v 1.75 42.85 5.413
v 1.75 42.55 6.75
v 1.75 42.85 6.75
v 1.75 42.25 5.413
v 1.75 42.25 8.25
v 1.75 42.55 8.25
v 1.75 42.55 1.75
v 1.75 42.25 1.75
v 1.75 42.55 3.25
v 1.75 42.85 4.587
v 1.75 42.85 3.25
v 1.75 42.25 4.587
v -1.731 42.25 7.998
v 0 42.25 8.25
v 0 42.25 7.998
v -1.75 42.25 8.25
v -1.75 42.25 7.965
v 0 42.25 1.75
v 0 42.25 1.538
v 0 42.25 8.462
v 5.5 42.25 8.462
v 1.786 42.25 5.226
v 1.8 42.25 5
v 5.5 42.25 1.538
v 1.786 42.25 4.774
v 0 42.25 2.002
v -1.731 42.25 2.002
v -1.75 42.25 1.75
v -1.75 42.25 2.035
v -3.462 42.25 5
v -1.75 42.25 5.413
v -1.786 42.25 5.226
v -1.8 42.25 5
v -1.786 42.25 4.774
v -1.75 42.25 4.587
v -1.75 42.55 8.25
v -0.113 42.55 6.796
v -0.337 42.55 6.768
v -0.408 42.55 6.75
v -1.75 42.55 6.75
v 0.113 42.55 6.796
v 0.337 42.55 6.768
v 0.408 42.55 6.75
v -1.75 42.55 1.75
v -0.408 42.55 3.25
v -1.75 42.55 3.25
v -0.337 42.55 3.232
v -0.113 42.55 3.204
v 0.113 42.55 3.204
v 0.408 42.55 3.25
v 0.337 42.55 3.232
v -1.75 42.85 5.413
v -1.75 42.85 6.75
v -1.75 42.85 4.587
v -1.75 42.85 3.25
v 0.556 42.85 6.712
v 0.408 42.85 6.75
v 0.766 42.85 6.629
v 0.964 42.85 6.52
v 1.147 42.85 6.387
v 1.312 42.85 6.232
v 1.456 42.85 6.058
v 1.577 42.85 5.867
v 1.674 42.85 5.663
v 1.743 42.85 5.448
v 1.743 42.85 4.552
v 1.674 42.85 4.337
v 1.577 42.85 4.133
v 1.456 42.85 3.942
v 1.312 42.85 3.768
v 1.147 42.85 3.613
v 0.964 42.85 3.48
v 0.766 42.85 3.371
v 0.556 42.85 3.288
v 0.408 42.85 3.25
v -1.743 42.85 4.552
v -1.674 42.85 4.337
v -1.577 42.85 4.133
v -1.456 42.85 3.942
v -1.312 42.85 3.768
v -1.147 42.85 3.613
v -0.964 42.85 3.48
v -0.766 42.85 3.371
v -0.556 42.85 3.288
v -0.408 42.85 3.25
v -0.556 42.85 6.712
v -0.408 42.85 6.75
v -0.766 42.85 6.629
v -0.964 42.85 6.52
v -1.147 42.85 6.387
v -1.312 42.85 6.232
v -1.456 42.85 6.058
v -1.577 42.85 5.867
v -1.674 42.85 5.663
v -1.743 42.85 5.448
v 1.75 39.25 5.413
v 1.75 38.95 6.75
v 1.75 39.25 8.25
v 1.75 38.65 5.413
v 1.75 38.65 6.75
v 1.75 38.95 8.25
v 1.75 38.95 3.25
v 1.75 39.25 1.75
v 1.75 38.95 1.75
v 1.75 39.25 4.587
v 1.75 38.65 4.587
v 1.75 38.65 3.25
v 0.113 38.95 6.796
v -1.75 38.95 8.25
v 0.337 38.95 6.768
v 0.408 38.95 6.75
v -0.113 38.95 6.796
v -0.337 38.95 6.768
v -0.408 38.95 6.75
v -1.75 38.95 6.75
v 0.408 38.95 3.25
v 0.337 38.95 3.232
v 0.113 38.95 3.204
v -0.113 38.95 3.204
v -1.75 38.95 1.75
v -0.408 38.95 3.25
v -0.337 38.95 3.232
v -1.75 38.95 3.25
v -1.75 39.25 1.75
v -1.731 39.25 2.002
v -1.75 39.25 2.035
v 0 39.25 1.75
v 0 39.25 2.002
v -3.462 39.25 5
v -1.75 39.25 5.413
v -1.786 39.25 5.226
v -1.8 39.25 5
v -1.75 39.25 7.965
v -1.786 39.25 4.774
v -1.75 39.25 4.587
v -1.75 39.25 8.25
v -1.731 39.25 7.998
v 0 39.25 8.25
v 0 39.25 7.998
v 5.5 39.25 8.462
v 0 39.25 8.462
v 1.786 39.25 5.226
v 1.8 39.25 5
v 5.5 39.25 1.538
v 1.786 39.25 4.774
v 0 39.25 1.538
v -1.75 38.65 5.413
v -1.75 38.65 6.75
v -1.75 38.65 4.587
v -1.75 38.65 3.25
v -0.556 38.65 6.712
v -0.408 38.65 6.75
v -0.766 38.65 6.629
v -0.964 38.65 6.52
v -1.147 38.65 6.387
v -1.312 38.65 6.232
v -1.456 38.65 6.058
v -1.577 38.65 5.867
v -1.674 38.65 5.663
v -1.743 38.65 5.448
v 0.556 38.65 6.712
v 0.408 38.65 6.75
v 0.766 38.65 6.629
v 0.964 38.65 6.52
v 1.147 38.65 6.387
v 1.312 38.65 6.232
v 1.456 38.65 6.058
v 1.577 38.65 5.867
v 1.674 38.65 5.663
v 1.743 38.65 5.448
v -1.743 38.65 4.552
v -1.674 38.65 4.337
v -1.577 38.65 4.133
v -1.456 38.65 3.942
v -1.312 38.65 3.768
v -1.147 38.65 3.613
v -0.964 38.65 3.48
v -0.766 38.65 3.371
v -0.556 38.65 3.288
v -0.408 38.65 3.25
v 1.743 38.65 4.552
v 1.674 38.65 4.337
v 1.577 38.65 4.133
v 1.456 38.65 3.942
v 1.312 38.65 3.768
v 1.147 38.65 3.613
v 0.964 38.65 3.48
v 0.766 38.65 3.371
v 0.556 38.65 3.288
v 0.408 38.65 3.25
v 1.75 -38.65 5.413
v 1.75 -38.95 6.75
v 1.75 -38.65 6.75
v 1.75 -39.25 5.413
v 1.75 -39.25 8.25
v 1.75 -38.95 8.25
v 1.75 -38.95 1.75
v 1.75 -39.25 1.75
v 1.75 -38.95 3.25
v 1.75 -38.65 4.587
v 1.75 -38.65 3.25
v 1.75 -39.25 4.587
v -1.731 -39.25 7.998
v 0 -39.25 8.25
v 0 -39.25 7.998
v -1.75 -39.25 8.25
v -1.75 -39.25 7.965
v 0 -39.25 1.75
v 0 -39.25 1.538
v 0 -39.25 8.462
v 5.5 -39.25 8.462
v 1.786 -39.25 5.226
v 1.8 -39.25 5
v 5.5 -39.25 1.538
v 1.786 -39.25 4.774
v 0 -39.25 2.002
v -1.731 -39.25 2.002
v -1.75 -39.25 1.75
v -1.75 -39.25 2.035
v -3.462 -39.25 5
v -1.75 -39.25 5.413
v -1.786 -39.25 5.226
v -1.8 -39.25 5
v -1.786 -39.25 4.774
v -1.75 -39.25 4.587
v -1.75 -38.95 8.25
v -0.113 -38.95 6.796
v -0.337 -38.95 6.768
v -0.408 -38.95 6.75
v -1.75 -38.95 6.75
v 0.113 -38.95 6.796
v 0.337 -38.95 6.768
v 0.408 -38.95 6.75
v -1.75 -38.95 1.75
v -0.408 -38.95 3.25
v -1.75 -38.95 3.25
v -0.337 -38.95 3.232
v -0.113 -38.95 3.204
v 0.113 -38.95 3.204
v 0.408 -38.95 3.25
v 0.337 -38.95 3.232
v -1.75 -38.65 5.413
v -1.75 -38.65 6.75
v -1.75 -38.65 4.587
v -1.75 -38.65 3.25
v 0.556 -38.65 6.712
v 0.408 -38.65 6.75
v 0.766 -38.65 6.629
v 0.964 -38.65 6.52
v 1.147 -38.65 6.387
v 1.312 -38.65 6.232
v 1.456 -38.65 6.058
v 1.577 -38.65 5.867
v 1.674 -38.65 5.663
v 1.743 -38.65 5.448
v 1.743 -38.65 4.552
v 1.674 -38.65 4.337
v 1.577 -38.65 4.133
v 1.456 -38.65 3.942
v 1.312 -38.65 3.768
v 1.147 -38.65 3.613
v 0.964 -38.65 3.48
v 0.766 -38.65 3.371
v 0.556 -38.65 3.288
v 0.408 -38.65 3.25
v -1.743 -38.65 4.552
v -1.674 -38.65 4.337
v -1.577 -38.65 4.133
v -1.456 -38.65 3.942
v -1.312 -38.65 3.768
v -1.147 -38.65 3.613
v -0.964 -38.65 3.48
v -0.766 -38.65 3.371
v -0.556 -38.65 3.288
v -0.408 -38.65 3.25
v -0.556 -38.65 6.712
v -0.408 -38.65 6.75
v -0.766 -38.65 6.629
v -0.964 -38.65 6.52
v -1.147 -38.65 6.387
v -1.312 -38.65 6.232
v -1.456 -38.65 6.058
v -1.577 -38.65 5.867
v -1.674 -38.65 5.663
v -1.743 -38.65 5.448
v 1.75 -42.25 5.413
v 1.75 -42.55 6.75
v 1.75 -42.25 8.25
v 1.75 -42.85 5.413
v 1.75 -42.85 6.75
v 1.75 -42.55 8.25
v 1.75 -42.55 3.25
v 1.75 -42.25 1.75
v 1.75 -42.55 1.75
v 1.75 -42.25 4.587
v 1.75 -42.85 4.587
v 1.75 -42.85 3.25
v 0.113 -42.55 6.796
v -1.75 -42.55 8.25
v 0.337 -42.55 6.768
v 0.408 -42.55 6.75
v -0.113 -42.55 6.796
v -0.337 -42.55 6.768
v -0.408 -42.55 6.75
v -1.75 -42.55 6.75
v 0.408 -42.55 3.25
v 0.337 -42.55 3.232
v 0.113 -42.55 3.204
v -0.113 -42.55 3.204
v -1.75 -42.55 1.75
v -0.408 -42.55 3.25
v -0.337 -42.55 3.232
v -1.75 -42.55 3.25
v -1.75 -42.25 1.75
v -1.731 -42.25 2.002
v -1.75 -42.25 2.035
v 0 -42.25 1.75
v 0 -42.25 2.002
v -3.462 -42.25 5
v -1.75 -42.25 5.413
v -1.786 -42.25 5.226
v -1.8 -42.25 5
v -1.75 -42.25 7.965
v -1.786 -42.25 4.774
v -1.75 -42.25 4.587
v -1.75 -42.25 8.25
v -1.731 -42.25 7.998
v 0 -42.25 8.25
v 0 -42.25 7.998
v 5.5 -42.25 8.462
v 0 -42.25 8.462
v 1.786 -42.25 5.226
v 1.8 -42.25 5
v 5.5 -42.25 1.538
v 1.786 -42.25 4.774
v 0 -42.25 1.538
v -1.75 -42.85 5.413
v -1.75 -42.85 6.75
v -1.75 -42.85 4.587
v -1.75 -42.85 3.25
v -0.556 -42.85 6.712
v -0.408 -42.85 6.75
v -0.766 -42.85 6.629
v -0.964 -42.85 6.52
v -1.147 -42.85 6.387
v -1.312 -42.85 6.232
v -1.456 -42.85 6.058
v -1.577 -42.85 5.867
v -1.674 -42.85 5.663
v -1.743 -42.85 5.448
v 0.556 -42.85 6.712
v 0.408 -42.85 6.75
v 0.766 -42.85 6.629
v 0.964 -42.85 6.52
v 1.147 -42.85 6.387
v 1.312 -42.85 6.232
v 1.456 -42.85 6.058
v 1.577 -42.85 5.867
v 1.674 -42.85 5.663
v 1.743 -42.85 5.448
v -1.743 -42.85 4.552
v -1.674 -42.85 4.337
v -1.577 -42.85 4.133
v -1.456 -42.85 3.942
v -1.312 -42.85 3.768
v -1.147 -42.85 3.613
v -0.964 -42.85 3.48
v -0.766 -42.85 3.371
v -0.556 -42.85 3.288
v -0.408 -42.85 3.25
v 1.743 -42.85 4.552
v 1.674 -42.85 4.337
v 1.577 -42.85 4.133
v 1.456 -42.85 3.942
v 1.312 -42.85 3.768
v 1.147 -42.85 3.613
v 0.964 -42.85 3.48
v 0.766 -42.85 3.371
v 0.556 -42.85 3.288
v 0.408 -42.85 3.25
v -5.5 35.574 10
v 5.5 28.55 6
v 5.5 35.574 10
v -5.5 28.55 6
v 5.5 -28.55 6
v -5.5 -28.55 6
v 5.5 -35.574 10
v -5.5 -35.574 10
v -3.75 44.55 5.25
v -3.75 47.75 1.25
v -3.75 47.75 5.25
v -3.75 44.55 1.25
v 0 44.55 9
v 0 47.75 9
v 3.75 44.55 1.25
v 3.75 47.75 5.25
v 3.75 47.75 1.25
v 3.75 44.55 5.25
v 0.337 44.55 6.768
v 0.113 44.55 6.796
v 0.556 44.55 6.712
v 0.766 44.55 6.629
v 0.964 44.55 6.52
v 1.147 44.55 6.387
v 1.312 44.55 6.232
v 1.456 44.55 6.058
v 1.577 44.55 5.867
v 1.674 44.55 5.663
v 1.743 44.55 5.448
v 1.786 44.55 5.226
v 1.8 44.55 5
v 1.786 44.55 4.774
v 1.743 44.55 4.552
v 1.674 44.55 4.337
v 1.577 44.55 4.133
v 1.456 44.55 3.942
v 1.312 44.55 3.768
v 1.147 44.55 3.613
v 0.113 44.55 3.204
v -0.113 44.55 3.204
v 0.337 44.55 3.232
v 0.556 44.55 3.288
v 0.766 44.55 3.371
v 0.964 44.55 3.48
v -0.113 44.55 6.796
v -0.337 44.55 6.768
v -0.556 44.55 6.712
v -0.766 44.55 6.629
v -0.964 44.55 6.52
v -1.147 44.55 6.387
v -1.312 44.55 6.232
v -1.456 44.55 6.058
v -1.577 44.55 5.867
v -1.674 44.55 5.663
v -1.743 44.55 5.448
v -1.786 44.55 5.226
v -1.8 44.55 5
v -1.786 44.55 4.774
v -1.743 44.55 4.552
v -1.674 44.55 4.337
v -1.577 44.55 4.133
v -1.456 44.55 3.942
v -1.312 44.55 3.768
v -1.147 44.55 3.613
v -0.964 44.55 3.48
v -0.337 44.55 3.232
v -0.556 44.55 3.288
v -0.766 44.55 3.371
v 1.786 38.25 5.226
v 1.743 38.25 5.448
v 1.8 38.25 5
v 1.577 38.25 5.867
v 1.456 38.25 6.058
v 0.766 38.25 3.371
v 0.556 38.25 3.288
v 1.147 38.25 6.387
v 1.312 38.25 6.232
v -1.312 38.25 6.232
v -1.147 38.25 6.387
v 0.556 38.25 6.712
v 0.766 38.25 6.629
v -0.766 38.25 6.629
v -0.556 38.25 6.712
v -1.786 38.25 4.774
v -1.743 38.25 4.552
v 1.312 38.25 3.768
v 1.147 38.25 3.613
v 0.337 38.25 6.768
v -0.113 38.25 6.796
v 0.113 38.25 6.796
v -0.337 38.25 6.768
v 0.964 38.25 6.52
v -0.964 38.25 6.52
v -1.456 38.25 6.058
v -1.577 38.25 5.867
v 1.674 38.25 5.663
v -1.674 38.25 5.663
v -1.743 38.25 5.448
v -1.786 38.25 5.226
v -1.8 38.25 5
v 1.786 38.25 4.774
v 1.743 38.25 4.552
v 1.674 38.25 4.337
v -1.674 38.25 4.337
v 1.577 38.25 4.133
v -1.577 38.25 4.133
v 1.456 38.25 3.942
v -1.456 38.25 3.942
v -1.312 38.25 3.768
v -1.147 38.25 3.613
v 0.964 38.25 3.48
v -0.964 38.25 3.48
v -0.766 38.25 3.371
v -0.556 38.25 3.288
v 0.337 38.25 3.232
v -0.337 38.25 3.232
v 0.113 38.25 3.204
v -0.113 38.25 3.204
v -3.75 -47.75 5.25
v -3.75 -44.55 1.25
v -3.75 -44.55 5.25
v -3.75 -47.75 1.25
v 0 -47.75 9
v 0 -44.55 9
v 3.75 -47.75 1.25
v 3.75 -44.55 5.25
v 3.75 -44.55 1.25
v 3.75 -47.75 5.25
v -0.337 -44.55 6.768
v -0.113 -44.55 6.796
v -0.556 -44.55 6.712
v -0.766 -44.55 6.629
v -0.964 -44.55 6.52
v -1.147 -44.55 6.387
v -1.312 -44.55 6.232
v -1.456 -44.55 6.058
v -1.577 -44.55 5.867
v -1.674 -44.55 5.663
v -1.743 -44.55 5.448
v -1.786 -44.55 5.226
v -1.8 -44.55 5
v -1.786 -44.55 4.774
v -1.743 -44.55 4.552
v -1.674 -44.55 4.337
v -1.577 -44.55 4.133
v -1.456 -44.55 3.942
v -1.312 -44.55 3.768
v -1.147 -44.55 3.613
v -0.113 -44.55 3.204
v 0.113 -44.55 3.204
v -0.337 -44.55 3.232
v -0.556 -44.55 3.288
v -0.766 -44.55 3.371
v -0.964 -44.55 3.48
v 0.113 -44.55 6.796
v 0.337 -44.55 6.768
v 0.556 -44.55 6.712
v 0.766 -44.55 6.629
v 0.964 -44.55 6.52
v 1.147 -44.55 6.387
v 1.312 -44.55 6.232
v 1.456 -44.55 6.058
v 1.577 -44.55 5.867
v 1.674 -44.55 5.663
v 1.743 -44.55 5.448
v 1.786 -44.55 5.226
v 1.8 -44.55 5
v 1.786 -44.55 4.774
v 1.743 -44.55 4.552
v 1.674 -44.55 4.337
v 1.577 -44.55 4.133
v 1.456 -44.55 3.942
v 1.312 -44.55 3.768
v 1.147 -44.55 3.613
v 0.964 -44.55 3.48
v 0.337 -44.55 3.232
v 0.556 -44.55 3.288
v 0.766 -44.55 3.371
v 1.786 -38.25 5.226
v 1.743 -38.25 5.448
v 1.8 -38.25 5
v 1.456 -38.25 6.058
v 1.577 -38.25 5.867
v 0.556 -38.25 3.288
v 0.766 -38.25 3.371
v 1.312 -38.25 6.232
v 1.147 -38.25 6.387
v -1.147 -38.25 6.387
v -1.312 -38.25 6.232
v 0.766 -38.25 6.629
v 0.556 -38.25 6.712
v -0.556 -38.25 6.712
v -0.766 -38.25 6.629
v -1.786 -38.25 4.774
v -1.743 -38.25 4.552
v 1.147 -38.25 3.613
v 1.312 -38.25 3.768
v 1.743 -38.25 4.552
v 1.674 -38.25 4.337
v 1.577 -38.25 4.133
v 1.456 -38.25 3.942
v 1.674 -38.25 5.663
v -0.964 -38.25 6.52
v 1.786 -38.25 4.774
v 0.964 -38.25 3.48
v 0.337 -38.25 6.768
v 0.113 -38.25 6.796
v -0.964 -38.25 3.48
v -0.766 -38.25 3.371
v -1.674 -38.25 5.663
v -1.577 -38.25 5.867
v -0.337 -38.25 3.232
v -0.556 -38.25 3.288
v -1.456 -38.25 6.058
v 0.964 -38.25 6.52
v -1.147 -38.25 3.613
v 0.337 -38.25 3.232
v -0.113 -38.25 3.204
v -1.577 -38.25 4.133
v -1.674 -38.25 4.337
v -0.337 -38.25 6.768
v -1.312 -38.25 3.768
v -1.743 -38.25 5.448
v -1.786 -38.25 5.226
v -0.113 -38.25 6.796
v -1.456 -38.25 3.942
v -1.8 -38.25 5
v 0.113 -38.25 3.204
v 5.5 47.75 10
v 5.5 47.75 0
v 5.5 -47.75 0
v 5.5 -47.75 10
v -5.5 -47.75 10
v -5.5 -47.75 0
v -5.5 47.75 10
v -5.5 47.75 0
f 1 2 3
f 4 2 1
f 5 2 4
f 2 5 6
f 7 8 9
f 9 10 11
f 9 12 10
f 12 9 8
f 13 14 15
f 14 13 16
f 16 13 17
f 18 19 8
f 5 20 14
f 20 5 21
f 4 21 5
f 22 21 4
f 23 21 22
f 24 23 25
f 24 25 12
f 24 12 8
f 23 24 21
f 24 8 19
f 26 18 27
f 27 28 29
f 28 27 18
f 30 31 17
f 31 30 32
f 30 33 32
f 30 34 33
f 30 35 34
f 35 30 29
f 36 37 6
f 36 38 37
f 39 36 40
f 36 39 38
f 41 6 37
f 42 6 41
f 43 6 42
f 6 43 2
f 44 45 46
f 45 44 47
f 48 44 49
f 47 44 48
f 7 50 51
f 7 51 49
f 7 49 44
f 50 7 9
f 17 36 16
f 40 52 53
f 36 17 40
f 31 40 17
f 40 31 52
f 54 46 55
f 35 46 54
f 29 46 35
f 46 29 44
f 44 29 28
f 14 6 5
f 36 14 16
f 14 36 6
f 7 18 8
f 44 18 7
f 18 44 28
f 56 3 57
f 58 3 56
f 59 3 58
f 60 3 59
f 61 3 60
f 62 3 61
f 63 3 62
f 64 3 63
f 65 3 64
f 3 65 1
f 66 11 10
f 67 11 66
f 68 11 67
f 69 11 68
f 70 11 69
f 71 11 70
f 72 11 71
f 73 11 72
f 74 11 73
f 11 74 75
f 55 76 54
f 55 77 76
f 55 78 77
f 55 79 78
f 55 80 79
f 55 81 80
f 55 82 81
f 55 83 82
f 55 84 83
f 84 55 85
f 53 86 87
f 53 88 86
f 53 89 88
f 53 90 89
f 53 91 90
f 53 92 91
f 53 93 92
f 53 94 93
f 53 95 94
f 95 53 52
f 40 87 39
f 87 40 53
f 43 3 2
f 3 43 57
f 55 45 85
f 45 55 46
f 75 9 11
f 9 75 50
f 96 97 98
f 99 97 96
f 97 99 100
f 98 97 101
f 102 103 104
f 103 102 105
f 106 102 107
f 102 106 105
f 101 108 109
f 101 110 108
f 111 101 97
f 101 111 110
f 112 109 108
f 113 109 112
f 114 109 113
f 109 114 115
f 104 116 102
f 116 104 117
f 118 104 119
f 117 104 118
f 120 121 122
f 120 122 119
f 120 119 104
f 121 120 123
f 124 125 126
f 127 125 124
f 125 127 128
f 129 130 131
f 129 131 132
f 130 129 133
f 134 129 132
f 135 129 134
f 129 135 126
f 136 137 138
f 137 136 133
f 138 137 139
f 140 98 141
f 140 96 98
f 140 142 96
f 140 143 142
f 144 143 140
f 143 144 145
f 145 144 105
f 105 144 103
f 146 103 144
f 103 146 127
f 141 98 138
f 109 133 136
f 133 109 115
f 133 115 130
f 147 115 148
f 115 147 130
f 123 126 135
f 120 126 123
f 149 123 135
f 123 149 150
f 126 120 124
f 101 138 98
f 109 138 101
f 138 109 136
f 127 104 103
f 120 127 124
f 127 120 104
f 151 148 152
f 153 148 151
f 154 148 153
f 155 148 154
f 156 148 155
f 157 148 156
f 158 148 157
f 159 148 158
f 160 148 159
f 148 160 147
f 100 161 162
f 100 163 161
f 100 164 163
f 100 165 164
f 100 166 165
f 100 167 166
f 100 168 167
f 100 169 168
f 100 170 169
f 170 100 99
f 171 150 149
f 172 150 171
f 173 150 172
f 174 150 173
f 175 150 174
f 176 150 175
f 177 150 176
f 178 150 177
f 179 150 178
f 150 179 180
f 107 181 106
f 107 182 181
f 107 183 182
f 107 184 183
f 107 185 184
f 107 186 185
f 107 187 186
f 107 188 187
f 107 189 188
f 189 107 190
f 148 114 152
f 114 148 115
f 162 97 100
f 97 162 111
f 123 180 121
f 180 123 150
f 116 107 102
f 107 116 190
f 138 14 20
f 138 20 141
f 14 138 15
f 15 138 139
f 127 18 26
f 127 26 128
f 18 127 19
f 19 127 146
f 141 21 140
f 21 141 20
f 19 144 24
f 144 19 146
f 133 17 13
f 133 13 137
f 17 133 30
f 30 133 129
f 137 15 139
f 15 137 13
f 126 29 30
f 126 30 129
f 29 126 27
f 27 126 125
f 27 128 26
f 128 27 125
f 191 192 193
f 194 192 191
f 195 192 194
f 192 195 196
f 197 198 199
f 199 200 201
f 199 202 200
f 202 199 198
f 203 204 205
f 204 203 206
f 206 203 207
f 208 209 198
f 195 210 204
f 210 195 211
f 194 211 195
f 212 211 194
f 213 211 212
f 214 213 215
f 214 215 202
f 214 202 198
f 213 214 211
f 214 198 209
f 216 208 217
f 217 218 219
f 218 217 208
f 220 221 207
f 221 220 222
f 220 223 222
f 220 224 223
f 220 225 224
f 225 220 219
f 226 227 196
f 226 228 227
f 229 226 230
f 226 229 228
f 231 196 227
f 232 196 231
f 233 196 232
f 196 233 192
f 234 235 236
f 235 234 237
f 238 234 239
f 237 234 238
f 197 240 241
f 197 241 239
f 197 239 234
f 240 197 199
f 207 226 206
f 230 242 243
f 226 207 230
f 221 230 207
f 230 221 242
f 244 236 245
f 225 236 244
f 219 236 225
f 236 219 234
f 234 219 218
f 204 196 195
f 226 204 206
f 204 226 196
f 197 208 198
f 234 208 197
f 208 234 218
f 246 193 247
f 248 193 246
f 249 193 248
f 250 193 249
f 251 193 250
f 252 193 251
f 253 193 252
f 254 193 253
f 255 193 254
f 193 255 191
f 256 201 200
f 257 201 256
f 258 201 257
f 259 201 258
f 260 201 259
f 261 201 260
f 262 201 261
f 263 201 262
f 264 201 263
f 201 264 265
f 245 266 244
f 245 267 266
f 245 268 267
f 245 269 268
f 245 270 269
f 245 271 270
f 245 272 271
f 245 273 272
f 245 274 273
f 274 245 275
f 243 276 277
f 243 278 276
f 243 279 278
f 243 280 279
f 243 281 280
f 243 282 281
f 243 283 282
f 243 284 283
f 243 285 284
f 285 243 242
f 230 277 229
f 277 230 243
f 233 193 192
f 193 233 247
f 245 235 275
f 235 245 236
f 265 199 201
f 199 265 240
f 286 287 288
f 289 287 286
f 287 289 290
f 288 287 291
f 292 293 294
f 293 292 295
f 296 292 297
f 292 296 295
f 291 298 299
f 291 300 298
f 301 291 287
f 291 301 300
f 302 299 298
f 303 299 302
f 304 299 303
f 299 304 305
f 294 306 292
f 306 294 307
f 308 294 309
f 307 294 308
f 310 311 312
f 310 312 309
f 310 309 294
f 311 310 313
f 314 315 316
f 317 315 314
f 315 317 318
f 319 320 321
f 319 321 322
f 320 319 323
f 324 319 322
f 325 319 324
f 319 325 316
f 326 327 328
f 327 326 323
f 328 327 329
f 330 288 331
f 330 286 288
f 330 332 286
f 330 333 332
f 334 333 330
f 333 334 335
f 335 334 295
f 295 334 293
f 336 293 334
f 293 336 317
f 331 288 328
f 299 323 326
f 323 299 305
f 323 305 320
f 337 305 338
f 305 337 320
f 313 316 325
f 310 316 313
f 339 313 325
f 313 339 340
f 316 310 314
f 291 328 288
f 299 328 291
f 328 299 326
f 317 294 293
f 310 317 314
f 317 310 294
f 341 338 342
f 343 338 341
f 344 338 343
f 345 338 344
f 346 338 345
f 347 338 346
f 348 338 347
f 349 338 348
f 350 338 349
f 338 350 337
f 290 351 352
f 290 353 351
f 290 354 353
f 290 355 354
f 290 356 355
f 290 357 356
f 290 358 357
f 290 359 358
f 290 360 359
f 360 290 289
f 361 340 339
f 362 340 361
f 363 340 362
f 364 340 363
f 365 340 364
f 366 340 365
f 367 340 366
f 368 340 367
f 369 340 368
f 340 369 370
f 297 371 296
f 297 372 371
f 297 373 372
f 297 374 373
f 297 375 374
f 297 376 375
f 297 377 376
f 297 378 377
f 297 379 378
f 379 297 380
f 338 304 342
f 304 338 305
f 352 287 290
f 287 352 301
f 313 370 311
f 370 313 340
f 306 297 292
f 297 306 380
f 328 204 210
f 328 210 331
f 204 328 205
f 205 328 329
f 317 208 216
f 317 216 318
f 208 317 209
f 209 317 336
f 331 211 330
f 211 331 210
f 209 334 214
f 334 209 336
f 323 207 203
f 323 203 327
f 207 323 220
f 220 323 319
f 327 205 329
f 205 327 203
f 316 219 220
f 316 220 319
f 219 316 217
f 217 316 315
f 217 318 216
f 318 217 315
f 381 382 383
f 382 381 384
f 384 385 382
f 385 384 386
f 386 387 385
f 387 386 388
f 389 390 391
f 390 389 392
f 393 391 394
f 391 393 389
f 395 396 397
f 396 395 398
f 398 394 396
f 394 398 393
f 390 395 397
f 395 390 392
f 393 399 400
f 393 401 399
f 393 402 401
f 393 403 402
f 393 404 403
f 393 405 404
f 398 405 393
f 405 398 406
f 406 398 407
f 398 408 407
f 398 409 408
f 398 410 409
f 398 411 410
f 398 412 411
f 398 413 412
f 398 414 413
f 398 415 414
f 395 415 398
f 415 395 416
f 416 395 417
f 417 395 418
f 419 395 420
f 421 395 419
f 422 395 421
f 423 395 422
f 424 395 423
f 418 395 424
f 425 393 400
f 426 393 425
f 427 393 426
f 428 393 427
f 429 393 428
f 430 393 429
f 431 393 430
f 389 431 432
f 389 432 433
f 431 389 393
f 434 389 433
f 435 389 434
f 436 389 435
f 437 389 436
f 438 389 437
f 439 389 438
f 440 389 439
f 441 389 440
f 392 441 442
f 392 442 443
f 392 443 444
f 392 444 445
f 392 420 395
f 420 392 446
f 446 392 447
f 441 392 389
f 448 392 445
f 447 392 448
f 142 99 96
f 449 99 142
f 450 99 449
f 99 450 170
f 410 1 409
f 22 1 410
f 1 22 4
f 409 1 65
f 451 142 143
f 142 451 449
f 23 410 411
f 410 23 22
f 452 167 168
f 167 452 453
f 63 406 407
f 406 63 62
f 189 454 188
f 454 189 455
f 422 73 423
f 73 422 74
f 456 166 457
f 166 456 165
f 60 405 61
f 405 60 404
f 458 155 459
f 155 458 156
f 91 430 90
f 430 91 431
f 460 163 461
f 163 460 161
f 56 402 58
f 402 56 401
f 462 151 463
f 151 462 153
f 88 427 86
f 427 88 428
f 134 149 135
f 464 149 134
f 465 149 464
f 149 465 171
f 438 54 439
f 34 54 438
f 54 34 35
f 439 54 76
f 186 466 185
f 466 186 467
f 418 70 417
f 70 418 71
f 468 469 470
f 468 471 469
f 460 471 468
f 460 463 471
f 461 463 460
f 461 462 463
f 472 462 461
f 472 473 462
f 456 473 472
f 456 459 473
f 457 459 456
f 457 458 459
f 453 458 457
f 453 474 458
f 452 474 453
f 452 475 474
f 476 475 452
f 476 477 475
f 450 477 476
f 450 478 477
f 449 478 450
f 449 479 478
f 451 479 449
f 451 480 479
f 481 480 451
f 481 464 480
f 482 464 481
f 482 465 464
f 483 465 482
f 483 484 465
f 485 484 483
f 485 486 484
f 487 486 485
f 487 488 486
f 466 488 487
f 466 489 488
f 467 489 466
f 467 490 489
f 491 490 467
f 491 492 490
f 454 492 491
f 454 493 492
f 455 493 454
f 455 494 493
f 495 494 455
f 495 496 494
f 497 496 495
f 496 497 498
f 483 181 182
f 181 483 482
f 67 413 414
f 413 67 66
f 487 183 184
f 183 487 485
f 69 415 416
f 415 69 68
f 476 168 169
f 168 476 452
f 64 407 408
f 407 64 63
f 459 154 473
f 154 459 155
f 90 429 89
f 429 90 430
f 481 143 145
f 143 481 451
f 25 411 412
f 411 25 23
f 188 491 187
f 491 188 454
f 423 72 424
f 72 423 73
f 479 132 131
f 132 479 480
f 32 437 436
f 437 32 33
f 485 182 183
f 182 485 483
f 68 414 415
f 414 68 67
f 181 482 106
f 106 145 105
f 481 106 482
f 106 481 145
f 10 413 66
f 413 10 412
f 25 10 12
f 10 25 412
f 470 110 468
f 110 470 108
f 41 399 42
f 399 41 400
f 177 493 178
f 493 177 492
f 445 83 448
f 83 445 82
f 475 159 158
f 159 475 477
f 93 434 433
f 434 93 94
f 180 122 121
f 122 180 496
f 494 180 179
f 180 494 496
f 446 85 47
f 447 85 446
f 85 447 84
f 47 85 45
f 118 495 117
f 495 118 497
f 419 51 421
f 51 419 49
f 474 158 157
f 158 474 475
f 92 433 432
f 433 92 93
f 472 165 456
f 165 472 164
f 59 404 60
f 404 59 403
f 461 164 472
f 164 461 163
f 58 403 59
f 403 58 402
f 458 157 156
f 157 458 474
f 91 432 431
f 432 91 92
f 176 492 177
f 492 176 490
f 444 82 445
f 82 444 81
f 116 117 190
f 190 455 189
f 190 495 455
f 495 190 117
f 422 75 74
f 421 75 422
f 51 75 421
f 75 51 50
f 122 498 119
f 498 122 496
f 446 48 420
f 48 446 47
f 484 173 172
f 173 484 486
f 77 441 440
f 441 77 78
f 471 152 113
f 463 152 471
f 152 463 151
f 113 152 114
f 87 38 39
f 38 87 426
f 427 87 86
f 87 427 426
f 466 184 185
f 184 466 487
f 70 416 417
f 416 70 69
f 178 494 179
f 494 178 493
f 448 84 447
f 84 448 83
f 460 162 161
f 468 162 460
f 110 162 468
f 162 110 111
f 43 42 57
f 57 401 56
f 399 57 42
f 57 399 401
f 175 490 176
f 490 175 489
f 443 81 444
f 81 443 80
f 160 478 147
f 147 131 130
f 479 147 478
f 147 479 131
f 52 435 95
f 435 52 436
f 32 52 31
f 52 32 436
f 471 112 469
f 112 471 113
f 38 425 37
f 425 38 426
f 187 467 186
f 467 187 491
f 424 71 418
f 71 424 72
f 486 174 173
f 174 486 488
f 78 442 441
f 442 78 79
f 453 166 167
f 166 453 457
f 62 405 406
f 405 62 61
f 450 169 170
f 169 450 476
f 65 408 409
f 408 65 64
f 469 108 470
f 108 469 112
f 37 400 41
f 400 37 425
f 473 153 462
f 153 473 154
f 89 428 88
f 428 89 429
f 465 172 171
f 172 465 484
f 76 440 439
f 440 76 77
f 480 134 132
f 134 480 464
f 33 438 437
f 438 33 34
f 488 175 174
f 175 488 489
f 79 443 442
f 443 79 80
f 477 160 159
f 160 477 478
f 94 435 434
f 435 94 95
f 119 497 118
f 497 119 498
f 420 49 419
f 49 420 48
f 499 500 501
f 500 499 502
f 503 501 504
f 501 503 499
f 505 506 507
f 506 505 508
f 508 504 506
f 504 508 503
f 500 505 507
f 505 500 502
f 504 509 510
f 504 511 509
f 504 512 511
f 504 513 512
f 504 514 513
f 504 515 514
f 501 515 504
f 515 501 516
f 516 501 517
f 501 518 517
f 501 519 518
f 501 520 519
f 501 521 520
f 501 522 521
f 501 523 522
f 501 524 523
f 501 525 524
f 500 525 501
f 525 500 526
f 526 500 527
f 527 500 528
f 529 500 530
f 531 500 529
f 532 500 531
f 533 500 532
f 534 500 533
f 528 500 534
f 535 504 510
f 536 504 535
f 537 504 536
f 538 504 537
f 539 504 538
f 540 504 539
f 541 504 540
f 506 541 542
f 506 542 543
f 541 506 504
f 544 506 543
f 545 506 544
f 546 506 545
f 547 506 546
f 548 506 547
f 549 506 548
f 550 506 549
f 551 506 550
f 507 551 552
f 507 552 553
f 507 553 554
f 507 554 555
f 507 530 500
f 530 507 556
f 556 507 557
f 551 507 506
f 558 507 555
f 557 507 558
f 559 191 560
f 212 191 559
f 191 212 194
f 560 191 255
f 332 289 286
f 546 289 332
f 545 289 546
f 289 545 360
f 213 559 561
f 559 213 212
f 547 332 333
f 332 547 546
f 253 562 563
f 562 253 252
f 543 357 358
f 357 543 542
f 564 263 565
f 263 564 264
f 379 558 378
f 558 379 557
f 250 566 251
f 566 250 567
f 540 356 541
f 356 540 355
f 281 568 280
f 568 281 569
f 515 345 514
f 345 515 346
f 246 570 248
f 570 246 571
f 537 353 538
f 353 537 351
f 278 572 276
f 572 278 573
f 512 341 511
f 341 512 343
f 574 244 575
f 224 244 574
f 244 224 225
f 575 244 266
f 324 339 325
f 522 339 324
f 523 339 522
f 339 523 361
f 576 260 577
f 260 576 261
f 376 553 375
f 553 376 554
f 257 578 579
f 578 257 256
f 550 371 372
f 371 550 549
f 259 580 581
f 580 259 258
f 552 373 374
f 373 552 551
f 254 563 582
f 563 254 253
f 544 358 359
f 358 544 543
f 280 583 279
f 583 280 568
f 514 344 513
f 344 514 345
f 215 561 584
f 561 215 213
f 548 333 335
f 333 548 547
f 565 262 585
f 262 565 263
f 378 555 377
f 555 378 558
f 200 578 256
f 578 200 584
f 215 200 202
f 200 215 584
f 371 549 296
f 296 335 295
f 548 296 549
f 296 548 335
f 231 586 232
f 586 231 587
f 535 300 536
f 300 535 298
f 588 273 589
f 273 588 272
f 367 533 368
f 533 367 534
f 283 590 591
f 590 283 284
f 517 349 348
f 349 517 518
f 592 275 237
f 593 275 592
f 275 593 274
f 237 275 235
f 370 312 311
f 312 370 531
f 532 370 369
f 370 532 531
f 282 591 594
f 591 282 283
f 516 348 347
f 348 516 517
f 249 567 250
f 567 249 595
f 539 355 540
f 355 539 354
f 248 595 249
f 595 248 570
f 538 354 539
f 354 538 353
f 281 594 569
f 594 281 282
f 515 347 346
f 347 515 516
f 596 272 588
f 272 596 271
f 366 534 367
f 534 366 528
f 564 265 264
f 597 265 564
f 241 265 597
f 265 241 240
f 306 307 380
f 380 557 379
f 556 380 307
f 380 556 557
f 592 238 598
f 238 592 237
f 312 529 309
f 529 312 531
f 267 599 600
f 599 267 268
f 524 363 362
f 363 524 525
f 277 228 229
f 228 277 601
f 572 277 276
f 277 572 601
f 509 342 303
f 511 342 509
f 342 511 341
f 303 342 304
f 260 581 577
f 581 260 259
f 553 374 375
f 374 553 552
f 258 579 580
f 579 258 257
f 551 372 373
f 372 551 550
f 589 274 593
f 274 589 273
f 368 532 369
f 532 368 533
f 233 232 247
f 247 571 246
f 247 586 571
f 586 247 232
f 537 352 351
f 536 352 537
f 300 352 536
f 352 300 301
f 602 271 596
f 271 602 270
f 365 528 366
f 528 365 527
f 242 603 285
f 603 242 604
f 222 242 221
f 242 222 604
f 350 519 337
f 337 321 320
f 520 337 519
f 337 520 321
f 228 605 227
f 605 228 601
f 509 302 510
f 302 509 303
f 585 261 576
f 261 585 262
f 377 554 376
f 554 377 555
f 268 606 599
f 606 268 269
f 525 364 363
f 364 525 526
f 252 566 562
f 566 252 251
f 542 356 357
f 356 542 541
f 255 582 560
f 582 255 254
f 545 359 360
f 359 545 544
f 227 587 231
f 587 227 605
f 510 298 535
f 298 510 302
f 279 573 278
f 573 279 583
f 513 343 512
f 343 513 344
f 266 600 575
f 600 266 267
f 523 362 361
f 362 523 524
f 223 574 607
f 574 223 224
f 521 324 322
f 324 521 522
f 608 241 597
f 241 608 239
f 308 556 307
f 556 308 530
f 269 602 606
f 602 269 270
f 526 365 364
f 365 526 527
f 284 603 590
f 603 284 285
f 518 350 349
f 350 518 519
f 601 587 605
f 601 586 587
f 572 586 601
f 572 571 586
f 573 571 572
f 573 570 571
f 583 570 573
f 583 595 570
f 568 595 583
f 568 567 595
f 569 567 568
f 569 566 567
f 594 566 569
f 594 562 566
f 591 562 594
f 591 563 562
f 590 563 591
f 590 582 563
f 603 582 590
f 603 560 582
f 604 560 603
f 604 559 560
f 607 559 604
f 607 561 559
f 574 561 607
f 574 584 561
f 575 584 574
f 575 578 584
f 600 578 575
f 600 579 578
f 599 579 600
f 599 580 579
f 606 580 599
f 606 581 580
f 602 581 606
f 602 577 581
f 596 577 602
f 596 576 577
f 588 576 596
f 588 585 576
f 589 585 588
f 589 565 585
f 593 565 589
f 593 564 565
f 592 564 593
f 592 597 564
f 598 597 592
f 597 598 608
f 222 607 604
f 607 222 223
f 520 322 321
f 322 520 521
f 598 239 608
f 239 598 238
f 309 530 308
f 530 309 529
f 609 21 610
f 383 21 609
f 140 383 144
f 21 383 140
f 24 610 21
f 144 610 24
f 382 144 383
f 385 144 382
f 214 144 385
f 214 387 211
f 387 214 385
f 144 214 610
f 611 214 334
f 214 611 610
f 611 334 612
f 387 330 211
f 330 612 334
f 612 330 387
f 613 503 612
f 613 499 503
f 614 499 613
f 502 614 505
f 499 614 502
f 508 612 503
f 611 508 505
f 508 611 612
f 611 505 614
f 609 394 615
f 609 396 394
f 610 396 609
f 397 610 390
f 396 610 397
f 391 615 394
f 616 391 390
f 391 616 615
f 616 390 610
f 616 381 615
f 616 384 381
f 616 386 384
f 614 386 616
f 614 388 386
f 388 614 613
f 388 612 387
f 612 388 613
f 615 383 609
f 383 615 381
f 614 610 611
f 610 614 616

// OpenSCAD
$fn = 50;

difference() {
	union() {
		translate(v = [0, 47.75, 0]) {
			rotate(a = [90, 0, 0]) {
				difference() {
					union() {
						translate(v = [-5.5, 0, 0]) {
							cube(size = [11.0, 10.0, 95.5]);
						}
					}
					union() {
						translate(v = [0, 5.0, 5.5]) {
							rotate(a = [0, 0, 0]) {
								difference() {
									union() {
										translate(v = [-1.75, -3.25, -0.3]) {
											cube(size = [3.5, 6.5, 0.3]);
										}
										translate(v = [-1.75, -1.75, -0.6]) {
											cube(size = [3.5, 3.5, 0.3]);
										}
										translate(v = [-1.75, -3.25, 3]) {
											cube(size = [3.5, 6.5, 0.3]);
										}
										translate(v = [-1.75, -1.75, 3.3]) {
											cube(size = [3.5, 3.5, 0.3]);
										}
										translate(v = [0.0, -3.4619999999999997, 0]) {
											cube(size = [20, 6.9239999999999995, 3]);
										}
										linear_extrude(height = 3) {
											polygon(points = [[3.4619999999999997, 0.0], [1.7310000000000003, 2.9981799479017264], [-1.7309999999999992, 2.9981799479017264], [-3.4619999999999997, 4.2397272186481365e-16], [-1.7310000000000014, -2.998179947901726], [1.7309999999999977, -2.9981799479017277]]);
										}
										translate(v = [-1.75, -3.25, -0.3]) {
											cube(size = [3.5, 6.5, 0.3]);
										}
										translate(v = [-1.75, -1.75, -0.6]) {
											cube(size = [3.5, 3.5, 0.3]);
										}
										translate(v = [-1.75, -3.25, 3]) {
											cube(size = [3.5, 6.5, 0.3]);
										}
										translate(v = [-1.75, -1.75, 3.3]) {
											cube(size = [3.5, 3.5, 0.3]);
										}
										translate(v = [-1.75, -3.25, -0.3]) {
											cube(size = [3.5, 6.5, 0.3]);
										}
										translate(v = [-1.75, -1.75, -0.6]) {
											cube(size = [3.5, 3.5, 0.3]);
										}
										translate(v = [-1.75, -3.25, 3]) {
											cube(size = [3.5, 6.5, 0.3]);
										}
										translate(v = [-1.75, -1.75, 3.3]) {
											cube(size = [3.5, 3.5, 0.3]);
										}
									}
									union();
								}
							}
						}
						translate(v = [0, 5.0, 87.0]) {
							rotate(a = [0, 0, 0]) {
								difference() {
									union() {
										translate(v = [-1.75, -3.25, -0.3]) {
											cube(size = [3.5, 6.5, 0.3]);
										}
										translate(v = [-1.75, -1.75, -0.6]) {
											cube(size = [3.5, 3.5, 0.3]);
										}
										translate(v = [-1.75, -3.25, 3]) {
											cube(size = [3.5, 6.5, 0.3]);
										}
										translate(v = [-1.75, -1.75, 3.3]) {
											cube(size = [3.5, 3.5, 0.3]);
										}
										translate(v = [0.0, -3.4619999999999997, 0]) {
											cube(size = [20, 6.9239999999999995, 3]);
										}
										linear_extrude(height = 3) {
											polygon(points = [[3.4619999999999997, 0.0], [1.7310000000000003, 2.9981799479017264], [-1.7309999999999992, 2.9981799479017264], [-3.4619999999999997, 4.2397272186481365e-16], [-1.7310000000000014, -2.998179947901726], [1.7309999999999977, -2.9981799479017277]]);
										}
										translate(v = [-1.75, -3.25, -0.3]) {
											cube(size = [3.5, 6.5, 0.3]);
										}
										translate(v = [-1.75, -1.75, -0.6]) {
											cube(size = [3.5, 3.5, 0.3]);
										}
										translate(v = [-1.75, -3.25, 3]) {
											cube(size = [3.5, 6.5, 0.3]);
										}
										translate(v = [-1.75, -1.75, 3.3]) {
											cube(size = [3.5, 3.5, 0.3]);
										}
										translate(v = [-1.75, -3.25, -0.3]) {
											cube(size = [3.5, 6.5, 0.3]);
										}
										translate(v = [-1.75, -1.75, -0.6]) {
											cube(size = [3.5, 3.5, 0.3]);
										}
										translate(v = [-1.75, -3.25, 3]) {
											cube(size = [3.5, 6.5, 0.3]);
										}
										translate(v = [-1.75, -1.75, 3.3]) {
											cube(size = [3.5, 3.5, 0.3]);
										}
									}
									union();
								}
							}
						}
						translate(v = [-5.6, 0, 0]) {
							rotate(a = [90, 0, 90]) {
								linear_extrude(height = 11.2) {
									polygon(points = [[10.1, 12.0], [10.1, 83.5], [6.0, 76.3], [6.0, 19.2]]);
								}
							}
						}
						translate(v = [0, 0, -0.1]) {
							linear_extrude(height = 3.3000000000000003) {
								polygon(points = [[-3.75, 1.25], [3.75, 1.25], [3.75, 5.25], [0, 9.0], [-3.75, 5.25]]);
							}
						}
						translate(v = [0, 5.0, -0.1]) {
							cylinder(h = 9.6, r = 1.8);
						}
						translate(v = [0, 0, 92.3]) {
							linear_extrude(height = 3.3000000000000003) {
								polygon(points = [[-3.75, 1.25], [3.75, 1.25], [3.75, 5.25], [0, 9.0], [-3.75, 5.25]]);
							}
						}
						translate(v = [0, 5.0, 86.0]) {
							cylinder(h = 9.6, r = 1.8);
						}
					}
				}
			}
		}
	}
	union();
}
